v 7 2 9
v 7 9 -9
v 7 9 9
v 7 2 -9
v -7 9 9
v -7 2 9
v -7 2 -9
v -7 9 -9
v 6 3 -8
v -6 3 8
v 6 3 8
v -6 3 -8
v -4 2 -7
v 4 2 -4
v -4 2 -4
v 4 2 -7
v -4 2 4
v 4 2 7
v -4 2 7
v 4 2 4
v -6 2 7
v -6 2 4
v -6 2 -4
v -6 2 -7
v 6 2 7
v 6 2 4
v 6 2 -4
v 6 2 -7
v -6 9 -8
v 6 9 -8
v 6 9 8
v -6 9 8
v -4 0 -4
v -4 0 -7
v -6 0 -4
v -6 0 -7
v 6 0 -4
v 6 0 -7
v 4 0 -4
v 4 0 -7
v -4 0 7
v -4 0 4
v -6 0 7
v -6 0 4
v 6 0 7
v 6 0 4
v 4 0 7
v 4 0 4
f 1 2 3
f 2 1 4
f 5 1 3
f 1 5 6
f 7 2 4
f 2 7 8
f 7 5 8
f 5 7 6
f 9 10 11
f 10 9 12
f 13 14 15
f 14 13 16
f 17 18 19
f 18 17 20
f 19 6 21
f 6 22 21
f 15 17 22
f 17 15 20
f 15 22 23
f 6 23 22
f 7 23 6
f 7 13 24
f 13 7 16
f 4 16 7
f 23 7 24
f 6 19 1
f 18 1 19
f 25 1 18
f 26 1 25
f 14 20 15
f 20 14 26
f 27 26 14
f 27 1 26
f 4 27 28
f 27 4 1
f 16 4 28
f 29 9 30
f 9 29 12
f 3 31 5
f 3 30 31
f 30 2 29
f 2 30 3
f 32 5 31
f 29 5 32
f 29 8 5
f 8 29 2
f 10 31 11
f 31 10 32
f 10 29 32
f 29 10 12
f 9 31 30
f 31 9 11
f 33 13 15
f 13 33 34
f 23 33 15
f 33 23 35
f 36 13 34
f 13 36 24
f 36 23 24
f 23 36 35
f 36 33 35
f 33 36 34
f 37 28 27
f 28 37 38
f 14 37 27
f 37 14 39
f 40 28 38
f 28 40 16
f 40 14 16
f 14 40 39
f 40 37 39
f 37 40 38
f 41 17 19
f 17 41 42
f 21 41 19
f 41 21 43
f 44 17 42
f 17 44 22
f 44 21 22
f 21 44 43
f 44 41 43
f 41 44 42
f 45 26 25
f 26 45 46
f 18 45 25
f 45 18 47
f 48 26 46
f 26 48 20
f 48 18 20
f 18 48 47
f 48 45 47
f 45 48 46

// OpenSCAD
// file: lib.scad
// Voxcraft box-model library (OpenSCAD).
//
// Conventions: 1 unit = 1 texture pixel = 1/16 block. Origin = entity feet centre. +Y up,
// the model faces -Z (forward). Pivots are in model space.
//
// vx_bone() and vx_box() both produce geometry (so the model can be previewed/rendered and its
// geometry validated) AND echo a machine-readable record that tools/scad_export.py turns into
// the runtime box model. The .scad files are the single editable source of truth.

// Declare a bone: name, parent ("" = root), pivot point the bone rotates around.
module vx_bone(name, parent, pivot) {
    echo("VXBONE", name, parent, pivot);
    %translate(pivot) sphere(0.5, $fn = 6);   // preview-only marker
}

// A textured box attached to a bone. tex: texture for all faces; front: texture for the -Z face.
module vx_box(bone, min, size, tex, front = "") {
    echo("VXBOX", bone, min, size, tex, front == "" ? tex : front);
    translate(min) cube(size);
}
// main file
// Cart: an open riveted iron tub on four small wheels. Original Voxcraft model.
// Faces -Z (forward). 14 px wide, 18 px long, rides 1 px above the rail.
include <lib.scad>

vx_bone("body", "", [0, 0, 0]);

vx_box("body", [-7, 2, -9], [14, 1, 18], "cart_metal");           // floor
vx_box("body", [-7, 3, -9], [14, 6, 1], "cart_metal");            // front wall
vx_box("body", [-7, 3, 8], [14, 6, 1], "cart_metal");             // back wall
vx_box("body", [-7, 3, -8], [1, 6, 16], "cart_metal");            // left wall
vx_box("body", [6, 3, -8], [1, 6, 16], "cart_metal");             // right wall
vx_box("body", [-6, 0, -7], [2, 2, 3], "cart_wheel");
vx_box("body", [4, 0, -7], [2, 2, 3], "cart_wheel");
vx_box("body", [-6, 0, 4], [2, 2, 3], "cart_wheel");
vx_box("body", [4, 0, 4], [2, 2, 3], "cart_wheel");
